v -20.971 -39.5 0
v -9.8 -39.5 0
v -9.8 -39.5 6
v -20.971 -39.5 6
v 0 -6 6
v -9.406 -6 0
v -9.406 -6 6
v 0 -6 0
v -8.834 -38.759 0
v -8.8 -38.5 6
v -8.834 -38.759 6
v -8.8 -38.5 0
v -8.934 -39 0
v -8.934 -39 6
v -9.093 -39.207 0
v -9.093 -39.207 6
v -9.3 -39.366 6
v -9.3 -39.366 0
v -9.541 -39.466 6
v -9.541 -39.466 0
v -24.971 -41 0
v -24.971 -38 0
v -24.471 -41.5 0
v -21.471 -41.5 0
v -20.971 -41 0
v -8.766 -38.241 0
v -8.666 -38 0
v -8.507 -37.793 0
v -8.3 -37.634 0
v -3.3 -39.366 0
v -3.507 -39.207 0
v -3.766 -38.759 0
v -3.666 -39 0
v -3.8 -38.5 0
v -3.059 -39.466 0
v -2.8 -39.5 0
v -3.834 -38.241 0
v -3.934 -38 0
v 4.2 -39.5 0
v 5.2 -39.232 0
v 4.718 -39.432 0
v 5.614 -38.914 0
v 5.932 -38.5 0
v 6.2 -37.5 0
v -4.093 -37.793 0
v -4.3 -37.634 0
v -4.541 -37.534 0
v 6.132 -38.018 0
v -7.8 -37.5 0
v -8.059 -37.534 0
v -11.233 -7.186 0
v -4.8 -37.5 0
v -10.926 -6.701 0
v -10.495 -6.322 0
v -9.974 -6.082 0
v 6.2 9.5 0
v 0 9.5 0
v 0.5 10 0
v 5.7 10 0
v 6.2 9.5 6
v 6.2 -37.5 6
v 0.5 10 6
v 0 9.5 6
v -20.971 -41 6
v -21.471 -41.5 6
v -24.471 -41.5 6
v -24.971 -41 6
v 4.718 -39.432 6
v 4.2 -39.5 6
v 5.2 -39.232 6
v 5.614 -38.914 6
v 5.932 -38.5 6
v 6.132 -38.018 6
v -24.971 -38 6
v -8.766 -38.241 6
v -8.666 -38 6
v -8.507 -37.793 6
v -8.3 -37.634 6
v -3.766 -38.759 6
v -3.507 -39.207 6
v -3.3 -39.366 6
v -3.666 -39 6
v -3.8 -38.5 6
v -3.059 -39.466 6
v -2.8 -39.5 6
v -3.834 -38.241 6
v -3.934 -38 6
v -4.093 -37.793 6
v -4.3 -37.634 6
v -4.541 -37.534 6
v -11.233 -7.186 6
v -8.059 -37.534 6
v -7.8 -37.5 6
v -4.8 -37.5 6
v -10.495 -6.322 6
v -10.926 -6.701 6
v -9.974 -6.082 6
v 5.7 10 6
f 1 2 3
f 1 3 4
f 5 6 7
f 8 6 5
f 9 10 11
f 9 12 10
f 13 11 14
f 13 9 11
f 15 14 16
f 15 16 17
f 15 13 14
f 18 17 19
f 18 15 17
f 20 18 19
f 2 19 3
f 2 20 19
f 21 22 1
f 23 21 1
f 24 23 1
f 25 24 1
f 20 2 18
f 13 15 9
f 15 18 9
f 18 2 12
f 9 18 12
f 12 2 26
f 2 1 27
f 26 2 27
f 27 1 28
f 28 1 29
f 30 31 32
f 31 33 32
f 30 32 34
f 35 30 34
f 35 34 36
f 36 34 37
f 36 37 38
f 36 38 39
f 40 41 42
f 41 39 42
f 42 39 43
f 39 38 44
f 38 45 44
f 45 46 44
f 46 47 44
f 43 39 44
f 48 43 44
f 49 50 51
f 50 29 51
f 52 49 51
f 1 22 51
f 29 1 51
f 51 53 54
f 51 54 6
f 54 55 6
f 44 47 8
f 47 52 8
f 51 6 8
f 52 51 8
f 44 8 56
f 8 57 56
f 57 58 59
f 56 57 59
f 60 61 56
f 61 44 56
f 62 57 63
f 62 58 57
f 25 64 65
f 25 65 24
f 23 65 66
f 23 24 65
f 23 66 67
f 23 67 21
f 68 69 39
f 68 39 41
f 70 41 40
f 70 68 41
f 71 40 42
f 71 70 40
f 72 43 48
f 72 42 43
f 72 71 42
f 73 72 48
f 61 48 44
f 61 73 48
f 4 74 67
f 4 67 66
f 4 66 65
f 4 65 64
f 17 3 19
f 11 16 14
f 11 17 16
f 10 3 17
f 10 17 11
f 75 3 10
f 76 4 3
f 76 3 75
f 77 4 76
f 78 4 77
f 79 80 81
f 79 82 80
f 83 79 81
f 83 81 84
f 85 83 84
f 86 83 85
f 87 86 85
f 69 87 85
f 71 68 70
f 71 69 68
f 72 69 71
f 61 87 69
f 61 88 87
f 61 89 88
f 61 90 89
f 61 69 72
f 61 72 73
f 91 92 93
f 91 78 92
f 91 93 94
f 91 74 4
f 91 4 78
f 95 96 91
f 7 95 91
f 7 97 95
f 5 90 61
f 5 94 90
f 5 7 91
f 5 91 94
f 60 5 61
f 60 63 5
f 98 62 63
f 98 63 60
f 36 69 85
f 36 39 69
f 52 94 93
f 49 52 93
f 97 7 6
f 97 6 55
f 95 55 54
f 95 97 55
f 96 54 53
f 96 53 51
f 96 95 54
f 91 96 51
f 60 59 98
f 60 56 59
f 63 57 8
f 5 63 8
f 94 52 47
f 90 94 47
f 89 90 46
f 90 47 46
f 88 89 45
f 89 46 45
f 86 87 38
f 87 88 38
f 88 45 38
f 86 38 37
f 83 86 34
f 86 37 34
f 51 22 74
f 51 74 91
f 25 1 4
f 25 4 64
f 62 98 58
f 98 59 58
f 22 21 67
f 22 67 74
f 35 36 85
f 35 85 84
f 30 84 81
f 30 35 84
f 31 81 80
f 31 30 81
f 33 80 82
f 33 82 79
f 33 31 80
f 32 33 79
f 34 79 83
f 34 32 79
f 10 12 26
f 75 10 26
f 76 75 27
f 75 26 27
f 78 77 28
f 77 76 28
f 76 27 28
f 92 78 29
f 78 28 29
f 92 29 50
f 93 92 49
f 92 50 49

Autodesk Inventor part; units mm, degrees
ref_plane "YZ Plane" through (0, 0, 0) normal (1, 0, 0) x (0, 1, 0)
ref_plane "XZ Plane" through (0, 0, 0) normal (0, 1, 0) x (-1, 0, 0)
ref_plane "XY Plane" through (0, 0, 0) normal (0, 0, 1) x (1, 0, 0)
ref_plane "Work Plane1" through (0, 0, 0) normal (0, 0, 1) x (1, 0, 0)
sketch "Sketch1" plane through (0, 0, 0) normal (0, 0, 1) x (1, 0, 0)
  line L0 (0, 0) -> (6.2, 0)
  line L1 (0, 0) -> (0, -6)
  line L2 (6.2, -6) -> (0, -6)
  line L3 (6.2, 0) -> (6.2, -6)
  line L4 (6.2, -14.15) -> (12.2, -14.15)
  line L5 (6.2, -6) -> (6.2, -14.15)
  line L6 (-8.8, -6) -> (6.2, -6)
  line L7 (-24.1812, -40.5) -> (-8.8, -6)
  line L8 (6.2, -40.5) -> (-24.1812, -40.5)
  line L9 (6.2, -34.15) -> (6.2, -40.5)
  line L10 (12.2, -34.15) -> (6.2, -34.15)
  line L11 (12.2, -14.15) -> (12.2, -34.15)
  line L12 (-26.0293, -42.3) -> (-19.9707, -42.3)
  line L13 (6.2, -14.15) -> (12.2, -14.15)
  line L14 (6.2, -6) -> (6.2, -14.15)
  line L15 (-8.8, -6) -> (6.2, -6)
  line L16 (-24.1812, -40.5) -> (-8.8, -6)
  line L17 (6.2, -40.5) -> (-24.1812, -40.5)
  line L18 (6.2, -34.15) -> (6.2, -40.5)
  line L19 (12.2, -34.15) -> (6.2, -34.15)
  line L20 (12.2, -14.15) -> (12.2, -34.15)
  line L21 (6.2, -39.5) -> (-20.9707, -39.5)
  line L22 (6.2, 10) -> (0, 10)
  line L23 (0, 10) -> (0, -6)
  line L24 (-20.9707, -39.5) -> (-20.9707, -41.5)
  line L25 (-20.9707, -41.5) -> (-24.9707, -41.5)
  line L26 (0, -6) -> (-8.8, -6)
  line L27 (-24.9707, -41.5) -> (-24.9707, -38)
  line L28 (-24.9707, -38) -> (-10.704, -6)
  line L29 (-10.704, -6) -> (-8.8, -6)
  line L30 (6.2, -39.5) -> (6.2, 10)
  dimension "d1" = 1
  dimension "d3" = 4
  dimension "d4" = 1
  dimension "d5" = 2
  dimension "d6" = 3.5
  dimension "d7" = 10
extrude "Plate1" add sketch "Sketch1" along normal blind 6 contours L23 L22 L30 L0 | L0 L3 L2 L1 | L2 L5 L30 L9 L21 L24 L8 L7 L6 | L7 L8 L24 L25 L27 L28 L29
sketch "Sketch2" plane through (0, 0, 6) normal (0, 0, 1) x (1, 0, 0)
  line L0 (6.2, 10) -> (6.2, -39.5) projected
  line L1 (0, 10) -> (6.2, 10) projected
  line L2 (0, -6) -> (0, 10) projected
  line L3 (-10.704, -6) -> (0, -6) projected
  line L4 (-24.9707, -38) -> (-10.704, -6) projected
  line L5 (-24.9707, -41.5) -> (-24.9707, -38) projected
  line L6 (-20.9707, -41.5) -> (-24.9707, -41.5) projected
  line L7 (-20.9707, -39.5) -> (-20.9707, -41.5) projected
  line L8 (6.2, -39.5) -> (-20.9707, -39.5) projected
  line L9 (-8.8, -39.5) -> (-3.8, -39.5)
  line L10 (-3.8, -39.5) -> (-3.8, -37.5)
  line L11 (-3.8, -37.5) -> (-8.8, -37.5)
  line L12 (-8.8, -37.5) -> (-8.8, -39.5)
  point P0 (0, 0)
  dimension "d9" = 5
  dimension "d10" = 2
  dimension "d11" = 10
extrude "Cut1" cut sketch "Sketch2" against normal blind 6 contours L8 L12 L11 L10
fillet "Corner Round1" radius 1 4 edges at (-8.8, -39.5, 3) (-8.8, -37.5, 3) (-3.8, -37.5, 3) (-3.8, -39.5, 3)
chamfer "Corner Chamfer1" distance 0.5 angle 45 2 edges at (-24.9707, -41.5, 3) (-20.9707, -41.5, 3)
chamfer "Corner Chamfer2" distance 0.5 angle 45 2 edges at (0, 10, 3) (6.2, 10, 3)
fillet "Corner Round2" radius 2 2 edges at (-10.704, -6, 3) (6.2, -39.5, 3)
equation "\"d12\" = Thickness"
equation "\"d8\" = Thickness"
equation "\"BendRadius\" = Thickness"
equation "\"BendReliefWidth\" = Thickness"
equation "\"BendReliefDepth\" = 0.5 * Thickness"
equation "\"CornerReliefSize\" = 4 * Thickness"
equation "\"MinimumRemnant\" = 2 * Thickness"
equation "\"TransitionRadius\" = BendRadius"
equation "\"JacobiRadiusSize\" = BendRadius"
equation "\"GapSize\" = Thickness"
equation "\"Thickness\" = 6"
properties part number "knop nuc" material "Wood (Birch)"
